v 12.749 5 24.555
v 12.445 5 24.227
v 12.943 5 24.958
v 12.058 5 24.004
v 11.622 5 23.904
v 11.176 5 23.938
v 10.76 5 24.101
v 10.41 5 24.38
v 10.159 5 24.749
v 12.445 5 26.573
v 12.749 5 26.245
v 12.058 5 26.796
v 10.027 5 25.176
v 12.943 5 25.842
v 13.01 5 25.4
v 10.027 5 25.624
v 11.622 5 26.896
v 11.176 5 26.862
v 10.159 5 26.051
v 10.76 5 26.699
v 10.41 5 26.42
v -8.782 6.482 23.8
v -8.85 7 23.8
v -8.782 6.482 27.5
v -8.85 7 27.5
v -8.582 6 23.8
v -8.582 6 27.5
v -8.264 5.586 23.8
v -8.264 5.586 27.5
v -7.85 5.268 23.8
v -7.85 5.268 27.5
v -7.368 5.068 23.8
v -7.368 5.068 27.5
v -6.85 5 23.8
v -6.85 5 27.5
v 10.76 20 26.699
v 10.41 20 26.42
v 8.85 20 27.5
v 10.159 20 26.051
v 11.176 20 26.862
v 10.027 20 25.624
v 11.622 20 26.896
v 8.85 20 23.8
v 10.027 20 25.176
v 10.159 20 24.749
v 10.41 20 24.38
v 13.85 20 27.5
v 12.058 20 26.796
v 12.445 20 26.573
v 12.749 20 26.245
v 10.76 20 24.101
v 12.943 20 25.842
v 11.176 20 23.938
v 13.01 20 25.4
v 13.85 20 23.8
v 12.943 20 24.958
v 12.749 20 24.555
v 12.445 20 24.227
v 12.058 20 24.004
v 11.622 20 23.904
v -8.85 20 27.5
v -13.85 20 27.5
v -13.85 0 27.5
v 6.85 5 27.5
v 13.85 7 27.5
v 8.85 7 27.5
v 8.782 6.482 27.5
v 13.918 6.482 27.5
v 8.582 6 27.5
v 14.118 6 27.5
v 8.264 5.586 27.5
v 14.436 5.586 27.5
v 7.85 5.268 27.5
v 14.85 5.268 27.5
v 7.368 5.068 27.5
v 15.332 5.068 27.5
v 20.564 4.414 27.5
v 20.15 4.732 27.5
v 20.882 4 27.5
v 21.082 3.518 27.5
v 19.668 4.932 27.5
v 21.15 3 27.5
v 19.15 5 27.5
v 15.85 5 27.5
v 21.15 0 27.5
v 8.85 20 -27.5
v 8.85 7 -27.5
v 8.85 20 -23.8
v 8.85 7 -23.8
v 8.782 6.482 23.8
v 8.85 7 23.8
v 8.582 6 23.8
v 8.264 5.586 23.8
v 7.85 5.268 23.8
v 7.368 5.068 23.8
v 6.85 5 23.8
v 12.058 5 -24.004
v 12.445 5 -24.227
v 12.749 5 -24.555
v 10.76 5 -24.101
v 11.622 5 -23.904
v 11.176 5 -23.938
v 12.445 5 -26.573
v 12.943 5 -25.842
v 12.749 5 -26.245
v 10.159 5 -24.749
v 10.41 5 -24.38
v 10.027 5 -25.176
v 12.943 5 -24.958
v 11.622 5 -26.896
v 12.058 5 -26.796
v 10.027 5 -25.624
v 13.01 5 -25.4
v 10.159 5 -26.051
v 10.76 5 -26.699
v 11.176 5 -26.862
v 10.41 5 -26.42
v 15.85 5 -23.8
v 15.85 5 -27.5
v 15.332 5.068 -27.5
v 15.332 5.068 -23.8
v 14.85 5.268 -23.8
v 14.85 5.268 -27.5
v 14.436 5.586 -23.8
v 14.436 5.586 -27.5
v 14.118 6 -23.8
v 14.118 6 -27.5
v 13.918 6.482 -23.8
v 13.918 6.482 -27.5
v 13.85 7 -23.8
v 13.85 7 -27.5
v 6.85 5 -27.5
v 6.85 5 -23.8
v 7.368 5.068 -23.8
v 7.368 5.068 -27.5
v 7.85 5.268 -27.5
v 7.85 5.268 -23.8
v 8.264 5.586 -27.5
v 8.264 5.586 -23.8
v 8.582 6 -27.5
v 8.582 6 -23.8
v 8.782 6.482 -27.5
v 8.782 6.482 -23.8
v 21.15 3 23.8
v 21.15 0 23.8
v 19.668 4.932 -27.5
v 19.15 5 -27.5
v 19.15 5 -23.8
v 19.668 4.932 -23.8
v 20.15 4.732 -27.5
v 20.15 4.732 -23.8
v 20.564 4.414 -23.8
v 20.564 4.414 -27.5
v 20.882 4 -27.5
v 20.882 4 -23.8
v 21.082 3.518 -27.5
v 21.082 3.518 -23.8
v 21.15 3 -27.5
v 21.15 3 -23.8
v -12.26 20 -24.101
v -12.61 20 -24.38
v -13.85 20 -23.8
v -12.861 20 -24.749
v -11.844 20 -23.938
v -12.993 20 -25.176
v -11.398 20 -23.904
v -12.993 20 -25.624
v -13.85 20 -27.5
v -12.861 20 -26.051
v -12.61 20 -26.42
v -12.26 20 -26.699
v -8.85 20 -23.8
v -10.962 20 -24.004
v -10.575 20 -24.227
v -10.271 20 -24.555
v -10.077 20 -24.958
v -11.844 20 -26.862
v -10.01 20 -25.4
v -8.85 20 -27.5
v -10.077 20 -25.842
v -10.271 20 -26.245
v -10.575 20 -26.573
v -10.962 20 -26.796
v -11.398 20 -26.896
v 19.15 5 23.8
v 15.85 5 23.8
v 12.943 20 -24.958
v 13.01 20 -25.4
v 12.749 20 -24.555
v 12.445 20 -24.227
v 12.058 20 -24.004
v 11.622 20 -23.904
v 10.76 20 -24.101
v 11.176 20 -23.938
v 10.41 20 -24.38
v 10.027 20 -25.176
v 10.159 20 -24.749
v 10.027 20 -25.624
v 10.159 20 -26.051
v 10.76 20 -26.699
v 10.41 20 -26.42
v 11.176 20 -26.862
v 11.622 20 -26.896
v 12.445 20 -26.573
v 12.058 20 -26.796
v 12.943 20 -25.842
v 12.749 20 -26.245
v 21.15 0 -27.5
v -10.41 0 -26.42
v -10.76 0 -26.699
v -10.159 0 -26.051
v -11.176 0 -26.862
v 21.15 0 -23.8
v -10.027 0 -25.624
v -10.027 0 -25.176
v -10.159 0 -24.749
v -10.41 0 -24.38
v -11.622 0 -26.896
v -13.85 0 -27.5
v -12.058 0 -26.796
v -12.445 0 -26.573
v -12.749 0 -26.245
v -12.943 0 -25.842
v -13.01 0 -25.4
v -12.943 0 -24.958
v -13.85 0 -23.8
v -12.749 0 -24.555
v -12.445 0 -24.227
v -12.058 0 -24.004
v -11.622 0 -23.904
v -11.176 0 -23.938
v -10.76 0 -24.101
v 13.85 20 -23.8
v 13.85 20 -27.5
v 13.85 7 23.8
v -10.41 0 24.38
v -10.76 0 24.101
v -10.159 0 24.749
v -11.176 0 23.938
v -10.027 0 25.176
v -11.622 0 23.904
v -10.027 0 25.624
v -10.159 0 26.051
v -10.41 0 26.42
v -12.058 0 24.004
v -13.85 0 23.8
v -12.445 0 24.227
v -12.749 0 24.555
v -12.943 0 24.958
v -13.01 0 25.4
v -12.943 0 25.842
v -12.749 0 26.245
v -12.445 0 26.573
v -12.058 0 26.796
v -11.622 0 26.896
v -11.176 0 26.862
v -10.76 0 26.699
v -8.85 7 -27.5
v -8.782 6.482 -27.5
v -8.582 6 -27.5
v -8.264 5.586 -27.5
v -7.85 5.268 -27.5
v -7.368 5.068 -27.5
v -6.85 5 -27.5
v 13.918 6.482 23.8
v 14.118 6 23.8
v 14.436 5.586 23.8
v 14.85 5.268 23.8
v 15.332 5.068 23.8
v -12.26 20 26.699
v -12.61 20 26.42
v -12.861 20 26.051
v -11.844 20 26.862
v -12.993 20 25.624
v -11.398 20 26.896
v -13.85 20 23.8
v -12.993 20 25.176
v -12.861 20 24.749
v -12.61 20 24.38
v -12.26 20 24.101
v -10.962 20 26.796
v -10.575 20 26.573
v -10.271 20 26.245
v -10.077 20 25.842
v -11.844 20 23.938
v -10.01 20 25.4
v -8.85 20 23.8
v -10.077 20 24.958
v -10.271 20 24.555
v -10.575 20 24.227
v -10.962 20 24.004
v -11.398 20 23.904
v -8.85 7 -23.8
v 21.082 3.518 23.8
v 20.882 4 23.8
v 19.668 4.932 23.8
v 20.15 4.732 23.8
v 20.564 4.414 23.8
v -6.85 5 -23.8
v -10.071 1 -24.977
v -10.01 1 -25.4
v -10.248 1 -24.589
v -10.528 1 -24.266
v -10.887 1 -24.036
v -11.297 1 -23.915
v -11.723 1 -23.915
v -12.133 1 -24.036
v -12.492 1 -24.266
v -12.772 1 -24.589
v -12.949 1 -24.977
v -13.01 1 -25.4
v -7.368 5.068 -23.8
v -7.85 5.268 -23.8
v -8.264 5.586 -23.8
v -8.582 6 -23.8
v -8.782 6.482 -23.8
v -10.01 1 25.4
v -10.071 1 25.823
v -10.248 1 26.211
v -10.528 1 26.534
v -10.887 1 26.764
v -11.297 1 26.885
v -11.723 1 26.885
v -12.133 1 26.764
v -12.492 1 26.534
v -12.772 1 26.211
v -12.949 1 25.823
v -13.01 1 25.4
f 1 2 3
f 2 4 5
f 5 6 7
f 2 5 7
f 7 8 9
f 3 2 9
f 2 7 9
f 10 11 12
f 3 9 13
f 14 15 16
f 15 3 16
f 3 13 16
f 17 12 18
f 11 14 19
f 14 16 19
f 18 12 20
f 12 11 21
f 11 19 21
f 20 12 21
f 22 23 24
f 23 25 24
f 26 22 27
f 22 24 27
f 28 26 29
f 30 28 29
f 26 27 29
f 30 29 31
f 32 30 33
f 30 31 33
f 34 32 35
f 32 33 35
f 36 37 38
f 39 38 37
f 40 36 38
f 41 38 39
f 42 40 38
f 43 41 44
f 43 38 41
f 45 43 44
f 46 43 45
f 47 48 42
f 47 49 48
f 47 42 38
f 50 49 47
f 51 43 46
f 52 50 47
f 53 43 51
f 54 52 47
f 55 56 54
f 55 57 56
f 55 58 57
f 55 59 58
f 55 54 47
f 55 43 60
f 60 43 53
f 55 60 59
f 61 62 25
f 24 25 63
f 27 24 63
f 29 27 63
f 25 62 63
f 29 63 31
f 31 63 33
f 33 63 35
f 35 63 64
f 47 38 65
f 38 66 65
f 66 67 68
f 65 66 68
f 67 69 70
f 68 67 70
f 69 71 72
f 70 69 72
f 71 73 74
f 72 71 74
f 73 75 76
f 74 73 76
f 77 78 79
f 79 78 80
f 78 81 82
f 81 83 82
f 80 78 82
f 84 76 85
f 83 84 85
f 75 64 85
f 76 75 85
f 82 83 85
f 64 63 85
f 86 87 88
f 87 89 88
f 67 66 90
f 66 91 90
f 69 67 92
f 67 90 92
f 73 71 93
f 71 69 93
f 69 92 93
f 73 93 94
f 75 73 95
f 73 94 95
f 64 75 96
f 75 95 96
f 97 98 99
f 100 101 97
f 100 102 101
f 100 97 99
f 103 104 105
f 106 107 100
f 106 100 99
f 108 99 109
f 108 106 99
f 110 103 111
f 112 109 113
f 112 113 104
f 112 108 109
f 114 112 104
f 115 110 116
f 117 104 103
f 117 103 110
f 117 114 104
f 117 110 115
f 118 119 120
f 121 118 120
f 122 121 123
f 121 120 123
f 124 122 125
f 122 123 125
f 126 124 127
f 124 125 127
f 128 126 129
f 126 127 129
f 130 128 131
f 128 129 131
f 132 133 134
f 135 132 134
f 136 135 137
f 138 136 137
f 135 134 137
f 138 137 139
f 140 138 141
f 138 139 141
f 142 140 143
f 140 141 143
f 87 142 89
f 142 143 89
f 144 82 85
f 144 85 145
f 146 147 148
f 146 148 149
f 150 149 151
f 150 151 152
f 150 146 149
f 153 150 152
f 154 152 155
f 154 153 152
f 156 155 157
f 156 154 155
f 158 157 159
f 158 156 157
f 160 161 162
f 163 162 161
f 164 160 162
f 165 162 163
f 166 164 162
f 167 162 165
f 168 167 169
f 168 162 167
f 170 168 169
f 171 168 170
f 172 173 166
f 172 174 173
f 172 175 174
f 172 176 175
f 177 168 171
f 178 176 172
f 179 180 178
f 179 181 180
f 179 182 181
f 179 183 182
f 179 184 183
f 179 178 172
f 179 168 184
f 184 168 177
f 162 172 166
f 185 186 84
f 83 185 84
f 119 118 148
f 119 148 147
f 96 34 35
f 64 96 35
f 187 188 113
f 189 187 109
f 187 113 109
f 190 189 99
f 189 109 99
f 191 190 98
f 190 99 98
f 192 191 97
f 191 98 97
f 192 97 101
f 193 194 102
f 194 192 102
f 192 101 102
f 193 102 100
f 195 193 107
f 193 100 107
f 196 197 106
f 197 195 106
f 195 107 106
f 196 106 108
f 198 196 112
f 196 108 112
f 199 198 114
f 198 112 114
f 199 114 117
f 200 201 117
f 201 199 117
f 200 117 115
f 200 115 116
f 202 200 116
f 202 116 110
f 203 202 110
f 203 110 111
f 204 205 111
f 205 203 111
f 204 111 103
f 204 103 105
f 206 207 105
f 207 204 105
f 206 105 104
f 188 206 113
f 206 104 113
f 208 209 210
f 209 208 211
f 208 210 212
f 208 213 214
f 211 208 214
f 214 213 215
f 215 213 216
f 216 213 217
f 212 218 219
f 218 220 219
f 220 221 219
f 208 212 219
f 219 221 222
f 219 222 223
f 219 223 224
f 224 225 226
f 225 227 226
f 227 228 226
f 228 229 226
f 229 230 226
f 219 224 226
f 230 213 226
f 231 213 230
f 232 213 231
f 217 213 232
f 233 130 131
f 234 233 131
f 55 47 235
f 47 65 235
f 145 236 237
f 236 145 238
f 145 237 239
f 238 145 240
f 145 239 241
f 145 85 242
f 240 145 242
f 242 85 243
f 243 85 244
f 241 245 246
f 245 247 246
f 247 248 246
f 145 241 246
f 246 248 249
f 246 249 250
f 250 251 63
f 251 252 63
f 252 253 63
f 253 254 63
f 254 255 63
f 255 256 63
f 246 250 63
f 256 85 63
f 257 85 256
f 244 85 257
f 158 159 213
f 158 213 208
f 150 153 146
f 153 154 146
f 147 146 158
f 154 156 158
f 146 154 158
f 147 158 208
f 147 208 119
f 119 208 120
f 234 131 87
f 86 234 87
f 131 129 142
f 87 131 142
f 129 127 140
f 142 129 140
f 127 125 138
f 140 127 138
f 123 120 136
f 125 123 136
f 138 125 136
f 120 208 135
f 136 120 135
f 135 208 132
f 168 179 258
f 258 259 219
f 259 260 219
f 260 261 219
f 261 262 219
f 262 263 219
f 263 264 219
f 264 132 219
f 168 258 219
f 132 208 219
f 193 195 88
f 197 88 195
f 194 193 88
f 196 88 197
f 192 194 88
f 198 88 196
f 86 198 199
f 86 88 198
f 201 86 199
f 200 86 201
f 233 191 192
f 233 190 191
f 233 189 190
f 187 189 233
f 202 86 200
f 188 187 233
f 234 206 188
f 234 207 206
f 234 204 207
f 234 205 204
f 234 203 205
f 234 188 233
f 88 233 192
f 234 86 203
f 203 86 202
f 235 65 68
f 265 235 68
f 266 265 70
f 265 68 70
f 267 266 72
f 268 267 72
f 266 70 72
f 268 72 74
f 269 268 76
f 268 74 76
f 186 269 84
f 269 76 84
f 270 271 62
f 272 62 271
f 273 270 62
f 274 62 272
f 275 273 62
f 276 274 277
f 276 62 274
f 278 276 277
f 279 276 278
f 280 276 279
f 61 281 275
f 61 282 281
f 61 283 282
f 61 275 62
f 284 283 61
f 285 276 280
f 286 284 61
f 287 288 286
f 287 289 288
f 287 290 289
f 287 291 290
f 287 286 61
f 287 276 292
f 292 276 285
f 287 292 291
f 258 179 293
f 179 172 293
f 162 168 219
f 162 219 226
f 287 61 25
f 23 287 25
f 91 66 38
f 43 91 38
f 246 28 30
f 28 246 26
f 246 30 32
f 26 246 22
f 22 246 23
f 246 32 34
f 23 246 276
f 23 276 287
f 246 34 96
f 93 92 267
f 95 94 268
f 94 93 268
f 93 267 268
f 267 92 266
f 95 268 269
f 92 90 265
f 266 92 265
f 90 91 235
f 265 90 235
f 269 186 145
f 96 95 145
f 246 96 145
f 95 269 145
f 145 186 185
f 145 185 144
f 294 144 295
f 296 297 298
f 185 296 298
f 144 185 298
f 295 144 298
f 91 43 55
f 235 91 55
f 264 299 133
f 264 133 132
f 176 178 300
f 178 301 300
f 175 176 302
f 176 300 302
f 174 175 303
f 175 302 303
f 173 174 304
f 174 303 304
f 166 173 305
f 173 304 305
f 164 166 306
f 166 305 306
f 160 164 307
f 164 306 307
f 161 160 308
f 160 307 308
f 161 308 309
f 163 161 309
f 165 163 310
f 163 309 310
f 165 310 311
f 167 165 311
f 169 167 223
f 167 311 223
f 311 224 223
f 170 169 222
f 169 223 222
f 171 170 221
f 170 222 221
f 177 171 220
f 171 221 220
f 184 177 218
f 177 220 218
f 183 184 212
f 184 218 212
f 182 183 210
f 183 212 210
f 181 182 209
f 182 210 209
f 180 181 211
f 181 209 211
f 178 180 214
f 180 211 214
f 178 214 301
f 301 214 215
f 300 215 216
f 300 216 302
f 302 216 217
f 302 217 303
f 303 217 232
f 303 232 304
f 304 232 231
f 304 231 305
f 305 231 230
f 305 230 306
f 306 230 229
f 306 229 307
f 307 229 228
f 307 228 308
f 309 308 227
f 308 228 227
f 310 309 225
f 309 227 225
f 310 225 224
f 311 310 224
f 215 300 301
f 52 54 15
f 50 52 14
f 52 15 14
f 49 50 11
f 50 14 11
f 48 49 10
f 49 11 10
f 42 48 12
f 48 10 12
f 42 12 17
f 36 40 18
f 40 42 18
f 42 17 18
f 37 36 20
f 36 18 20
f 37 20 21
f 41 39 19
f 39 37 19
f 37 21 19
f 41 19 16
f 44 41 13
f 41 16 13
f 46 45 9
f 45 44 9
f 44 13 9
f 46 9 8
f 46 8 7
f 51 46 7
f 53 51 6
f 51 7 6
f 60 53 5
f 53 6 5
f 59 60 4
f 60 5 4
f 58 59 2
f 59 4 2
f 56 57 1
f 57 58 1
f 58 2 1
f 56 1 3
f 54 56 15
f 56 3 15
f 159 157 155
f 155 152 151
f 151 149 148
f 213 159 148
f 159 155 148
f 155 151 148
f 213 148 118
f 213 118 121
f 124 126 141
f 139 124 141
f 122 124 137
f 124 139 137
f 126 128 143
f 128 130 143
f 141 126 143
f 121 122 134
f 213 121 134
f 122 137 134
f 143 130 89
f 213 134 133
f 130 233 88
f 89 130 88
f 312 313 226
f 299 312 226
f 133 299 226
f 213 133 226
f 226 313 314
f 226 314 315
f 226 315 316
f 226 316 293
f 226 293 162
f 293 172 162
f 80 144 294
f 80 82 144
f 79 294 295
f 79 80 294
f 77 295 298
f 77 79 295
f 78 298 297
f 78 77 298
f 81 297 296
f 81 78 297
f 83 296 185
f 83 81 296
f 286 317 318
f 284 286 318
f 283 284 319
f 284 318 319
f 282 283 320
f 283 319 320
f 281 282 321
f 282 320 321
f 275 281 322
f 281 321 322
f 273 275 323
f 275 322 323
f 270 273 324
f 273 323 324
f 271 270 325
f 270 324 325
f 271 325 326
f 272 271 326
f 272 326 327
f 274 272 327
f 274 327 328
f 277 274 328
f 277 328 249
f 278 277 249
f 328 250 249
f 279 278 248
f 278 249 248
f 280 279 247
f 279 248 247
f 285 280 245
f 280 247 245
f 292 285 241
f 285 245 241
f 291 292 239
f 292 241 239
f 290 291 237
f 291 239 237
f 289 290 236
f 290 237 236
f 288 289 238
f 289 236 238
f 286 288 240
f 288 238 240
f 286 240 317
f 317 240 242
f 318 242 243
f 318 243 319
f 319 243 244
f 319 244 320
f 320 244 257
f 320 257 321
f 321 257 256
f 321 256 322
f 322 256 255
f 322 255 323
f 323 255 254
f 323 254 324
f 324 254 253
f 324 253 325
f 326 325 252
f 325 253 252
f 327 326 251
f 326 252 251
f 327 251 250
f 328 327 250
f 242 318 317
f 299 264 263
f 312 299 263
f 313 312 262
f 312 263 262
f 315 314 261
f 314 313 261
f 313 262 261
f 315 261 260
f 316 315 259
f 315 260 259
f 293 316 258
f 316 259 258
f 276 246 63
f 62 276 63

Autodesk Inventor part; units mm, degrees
ref_plane "YZ Plane" through (0, 0, 0) normal (1, 0, 0) x (0, 1, 0)
ref_plane "XZ Plane" through (0, 0, 0) normal (0, 1, 0) x (-1, 0, 0)
ref_plane "XY Plane" through (0, 0, 0) normal (0, 0, 1) x (1, 0, 0)
sketch "Sketch1" plane through (0, 0, 0) normal (0, 1, 0) x (-1, 0, 0)
  line L0 (13.85, 27.5) -> (-13.85, 27.5)
  line L1 (-13.85, 27.5) -> (-13.85, -27.5)
  line L2 (-13.85, -27.5) -> (13.85, -27.5)
  line L3 (13.85, -27.5) -> (13.85, 27.5)
  line L4 (13.85, 27.5) -> (-13.85, -27.5) construction
  line L5 (-13.85, 27.5) -> (13.85, -27.5) construction
  line L6 (0, 27.5) -> (0, -27.5) construction
  line L7 (13.85, 0) -> (-13.85, 0) construction
  circle A0 centre (11.51, 25.4) radius 1.5
  circle A1 centre (11.51, -25.4) radius 1.5
  circle A2 centre (-11.51, 25.4) radius 1.5
  circle A3 centre (-11.51, -25.4) radius 1.5
  point P0 (0, 0)
  dimension "d0" = 27.7
  dimension "d1" = 55
  dimension "d2" = 3
  dimension "d3" = 2.34
  dimension "d4" = 2.1
extrude "Extrusion1" add sketch "Sketch1" along normal blind 1
sketch "Sketch2" plane through (0, 1, 0) normal (0, 1, 0) x (1, 0, 0)
  circle A0 centre (11.51, 25.4) radius 1.5 projected
  circle A1 centre (11.51, -25.4) radius 1.5 projected
  circle A2 centre (-11.51, 25.4) radius 1.5 projected
  circle A3 centre (-11.51, -25.4) radius 1.5 projected
  line L0 (-13.85, -27.5) -> (13.85, -27.5) projected
  line L1 (13.85, -27.5) -> (13.85, 27.5) projected
  line L2 (13.85, 27.5) -> (-13.85, 27.5) projected
  line L3 (-13.85, 27.5) -> (-13.85, -27.5) projected
  point P0 (0, 0)
extrude "Extrusion2" add sketch "Sketch2" along normal blind 19
sketch "Sketch3" plane through (0, 20, 0) normal (0, 1, 0) x (1, 0, 0)
  line L0 (-13.85, 27.5) -> (-13.85, -27.5) projected
  line L1 (13.85, -27.5) -> (13.85, 27.5) projected
  line L2 (-13.85, -23.8) -> (13.85, -23.8)
  line L3 (13.85, -23.8) -> (13.85, 23.8)
  line L4 (13.85, 23.8) -> (-13.85, 23.8)
  line L5 (-13.85, 23.8) -> (-13.85, -23.8)
  line L6 (-13.85, -27.5) -> (13.85, -27.5) projected
  line L7 (13.85, 27.5) -> (-13.85, 27.5) projected
  point P0 (0, 0)
  dimension "d9" = 3.7
  dimension "d10" = 3.7
extrude "Extrusion3" cut sketch "Sketch3" against normal blind 20 contours L4 L1 L2 L0
sketch "Sketch4" plane through (-13.85, 0, 27.5) normal (0, 0, 1) x (1, 0, 0)
  line L0 (0, 0) -> (27.7, 0) projected
  line L1 (27.7, 20) -> (0, 20) projected
  line L2 (5, 0) -> (22.7, 0)
  line L3 (22.7, 0) -> (22.7, 20)
  line L4 (22.7, 20) -> (5, 20)
  line L5 (5, 20) -> (5, 0)
  line L6 (0, 0) -> (0, 20) projected
  line L7 (27.7, 0) -> (27.7, 20) projected
  point P0 (13.85, 0)
  dimension "d13" = 5
  dimension "d14" = 5
extrude "Extrusion4" cut sketch "Sketch4" against normal through all contours L5 L1 L3 L0
sketch "Sketch5" plane through (-8.85, 0, 27.5) normal (1, 0, 0) x (0, 0, -1)
  line L0 (3.7, 0) -> (0, 0) projected
  line L1 (3.7, 20) -> (3.7, 0) projected
  line L2 (0, 0) -> (3.7, 0)
  line L3 (3.7, 0) -> (3.7, 5)
  line L4 (3.7, 5) -> (0, 5)
  line L5 (0, 5) -> (0, 0)
  line L6 (51.3, 0) -> (51.3, 20) projected
  line L7 (55, 0) -> (55, 20) projected
  line L8 (51.3, 5) -> (55, 5)
  line L9 (55, 5) -> (55, 0)
  line L10 (55, 0) -> (51.3, 0)
  line L11 (51.3, 0) -> (51.3, 5)
  point P0 (27.5, 0)
  dimension "d17" = 5
extrude "Extrusion5" add sketch "Sketch5" along normal blind 30
fillet "Fillet1" radius 2 8 edges at (-8.85, 5, 25.65) (13.85, 5, 25.65) (8.85, 5, 25.65) (21.15, 5, 25.65) (21.15, 5, -25.65) (13.85, 5, -25.65) (8.85, 5, -25.65) (-8.85, 5, -25.65)
equation "\"d10\" = d9"
equation "\"d14\" = d13"
properties part number "esp32_footprint_support"
